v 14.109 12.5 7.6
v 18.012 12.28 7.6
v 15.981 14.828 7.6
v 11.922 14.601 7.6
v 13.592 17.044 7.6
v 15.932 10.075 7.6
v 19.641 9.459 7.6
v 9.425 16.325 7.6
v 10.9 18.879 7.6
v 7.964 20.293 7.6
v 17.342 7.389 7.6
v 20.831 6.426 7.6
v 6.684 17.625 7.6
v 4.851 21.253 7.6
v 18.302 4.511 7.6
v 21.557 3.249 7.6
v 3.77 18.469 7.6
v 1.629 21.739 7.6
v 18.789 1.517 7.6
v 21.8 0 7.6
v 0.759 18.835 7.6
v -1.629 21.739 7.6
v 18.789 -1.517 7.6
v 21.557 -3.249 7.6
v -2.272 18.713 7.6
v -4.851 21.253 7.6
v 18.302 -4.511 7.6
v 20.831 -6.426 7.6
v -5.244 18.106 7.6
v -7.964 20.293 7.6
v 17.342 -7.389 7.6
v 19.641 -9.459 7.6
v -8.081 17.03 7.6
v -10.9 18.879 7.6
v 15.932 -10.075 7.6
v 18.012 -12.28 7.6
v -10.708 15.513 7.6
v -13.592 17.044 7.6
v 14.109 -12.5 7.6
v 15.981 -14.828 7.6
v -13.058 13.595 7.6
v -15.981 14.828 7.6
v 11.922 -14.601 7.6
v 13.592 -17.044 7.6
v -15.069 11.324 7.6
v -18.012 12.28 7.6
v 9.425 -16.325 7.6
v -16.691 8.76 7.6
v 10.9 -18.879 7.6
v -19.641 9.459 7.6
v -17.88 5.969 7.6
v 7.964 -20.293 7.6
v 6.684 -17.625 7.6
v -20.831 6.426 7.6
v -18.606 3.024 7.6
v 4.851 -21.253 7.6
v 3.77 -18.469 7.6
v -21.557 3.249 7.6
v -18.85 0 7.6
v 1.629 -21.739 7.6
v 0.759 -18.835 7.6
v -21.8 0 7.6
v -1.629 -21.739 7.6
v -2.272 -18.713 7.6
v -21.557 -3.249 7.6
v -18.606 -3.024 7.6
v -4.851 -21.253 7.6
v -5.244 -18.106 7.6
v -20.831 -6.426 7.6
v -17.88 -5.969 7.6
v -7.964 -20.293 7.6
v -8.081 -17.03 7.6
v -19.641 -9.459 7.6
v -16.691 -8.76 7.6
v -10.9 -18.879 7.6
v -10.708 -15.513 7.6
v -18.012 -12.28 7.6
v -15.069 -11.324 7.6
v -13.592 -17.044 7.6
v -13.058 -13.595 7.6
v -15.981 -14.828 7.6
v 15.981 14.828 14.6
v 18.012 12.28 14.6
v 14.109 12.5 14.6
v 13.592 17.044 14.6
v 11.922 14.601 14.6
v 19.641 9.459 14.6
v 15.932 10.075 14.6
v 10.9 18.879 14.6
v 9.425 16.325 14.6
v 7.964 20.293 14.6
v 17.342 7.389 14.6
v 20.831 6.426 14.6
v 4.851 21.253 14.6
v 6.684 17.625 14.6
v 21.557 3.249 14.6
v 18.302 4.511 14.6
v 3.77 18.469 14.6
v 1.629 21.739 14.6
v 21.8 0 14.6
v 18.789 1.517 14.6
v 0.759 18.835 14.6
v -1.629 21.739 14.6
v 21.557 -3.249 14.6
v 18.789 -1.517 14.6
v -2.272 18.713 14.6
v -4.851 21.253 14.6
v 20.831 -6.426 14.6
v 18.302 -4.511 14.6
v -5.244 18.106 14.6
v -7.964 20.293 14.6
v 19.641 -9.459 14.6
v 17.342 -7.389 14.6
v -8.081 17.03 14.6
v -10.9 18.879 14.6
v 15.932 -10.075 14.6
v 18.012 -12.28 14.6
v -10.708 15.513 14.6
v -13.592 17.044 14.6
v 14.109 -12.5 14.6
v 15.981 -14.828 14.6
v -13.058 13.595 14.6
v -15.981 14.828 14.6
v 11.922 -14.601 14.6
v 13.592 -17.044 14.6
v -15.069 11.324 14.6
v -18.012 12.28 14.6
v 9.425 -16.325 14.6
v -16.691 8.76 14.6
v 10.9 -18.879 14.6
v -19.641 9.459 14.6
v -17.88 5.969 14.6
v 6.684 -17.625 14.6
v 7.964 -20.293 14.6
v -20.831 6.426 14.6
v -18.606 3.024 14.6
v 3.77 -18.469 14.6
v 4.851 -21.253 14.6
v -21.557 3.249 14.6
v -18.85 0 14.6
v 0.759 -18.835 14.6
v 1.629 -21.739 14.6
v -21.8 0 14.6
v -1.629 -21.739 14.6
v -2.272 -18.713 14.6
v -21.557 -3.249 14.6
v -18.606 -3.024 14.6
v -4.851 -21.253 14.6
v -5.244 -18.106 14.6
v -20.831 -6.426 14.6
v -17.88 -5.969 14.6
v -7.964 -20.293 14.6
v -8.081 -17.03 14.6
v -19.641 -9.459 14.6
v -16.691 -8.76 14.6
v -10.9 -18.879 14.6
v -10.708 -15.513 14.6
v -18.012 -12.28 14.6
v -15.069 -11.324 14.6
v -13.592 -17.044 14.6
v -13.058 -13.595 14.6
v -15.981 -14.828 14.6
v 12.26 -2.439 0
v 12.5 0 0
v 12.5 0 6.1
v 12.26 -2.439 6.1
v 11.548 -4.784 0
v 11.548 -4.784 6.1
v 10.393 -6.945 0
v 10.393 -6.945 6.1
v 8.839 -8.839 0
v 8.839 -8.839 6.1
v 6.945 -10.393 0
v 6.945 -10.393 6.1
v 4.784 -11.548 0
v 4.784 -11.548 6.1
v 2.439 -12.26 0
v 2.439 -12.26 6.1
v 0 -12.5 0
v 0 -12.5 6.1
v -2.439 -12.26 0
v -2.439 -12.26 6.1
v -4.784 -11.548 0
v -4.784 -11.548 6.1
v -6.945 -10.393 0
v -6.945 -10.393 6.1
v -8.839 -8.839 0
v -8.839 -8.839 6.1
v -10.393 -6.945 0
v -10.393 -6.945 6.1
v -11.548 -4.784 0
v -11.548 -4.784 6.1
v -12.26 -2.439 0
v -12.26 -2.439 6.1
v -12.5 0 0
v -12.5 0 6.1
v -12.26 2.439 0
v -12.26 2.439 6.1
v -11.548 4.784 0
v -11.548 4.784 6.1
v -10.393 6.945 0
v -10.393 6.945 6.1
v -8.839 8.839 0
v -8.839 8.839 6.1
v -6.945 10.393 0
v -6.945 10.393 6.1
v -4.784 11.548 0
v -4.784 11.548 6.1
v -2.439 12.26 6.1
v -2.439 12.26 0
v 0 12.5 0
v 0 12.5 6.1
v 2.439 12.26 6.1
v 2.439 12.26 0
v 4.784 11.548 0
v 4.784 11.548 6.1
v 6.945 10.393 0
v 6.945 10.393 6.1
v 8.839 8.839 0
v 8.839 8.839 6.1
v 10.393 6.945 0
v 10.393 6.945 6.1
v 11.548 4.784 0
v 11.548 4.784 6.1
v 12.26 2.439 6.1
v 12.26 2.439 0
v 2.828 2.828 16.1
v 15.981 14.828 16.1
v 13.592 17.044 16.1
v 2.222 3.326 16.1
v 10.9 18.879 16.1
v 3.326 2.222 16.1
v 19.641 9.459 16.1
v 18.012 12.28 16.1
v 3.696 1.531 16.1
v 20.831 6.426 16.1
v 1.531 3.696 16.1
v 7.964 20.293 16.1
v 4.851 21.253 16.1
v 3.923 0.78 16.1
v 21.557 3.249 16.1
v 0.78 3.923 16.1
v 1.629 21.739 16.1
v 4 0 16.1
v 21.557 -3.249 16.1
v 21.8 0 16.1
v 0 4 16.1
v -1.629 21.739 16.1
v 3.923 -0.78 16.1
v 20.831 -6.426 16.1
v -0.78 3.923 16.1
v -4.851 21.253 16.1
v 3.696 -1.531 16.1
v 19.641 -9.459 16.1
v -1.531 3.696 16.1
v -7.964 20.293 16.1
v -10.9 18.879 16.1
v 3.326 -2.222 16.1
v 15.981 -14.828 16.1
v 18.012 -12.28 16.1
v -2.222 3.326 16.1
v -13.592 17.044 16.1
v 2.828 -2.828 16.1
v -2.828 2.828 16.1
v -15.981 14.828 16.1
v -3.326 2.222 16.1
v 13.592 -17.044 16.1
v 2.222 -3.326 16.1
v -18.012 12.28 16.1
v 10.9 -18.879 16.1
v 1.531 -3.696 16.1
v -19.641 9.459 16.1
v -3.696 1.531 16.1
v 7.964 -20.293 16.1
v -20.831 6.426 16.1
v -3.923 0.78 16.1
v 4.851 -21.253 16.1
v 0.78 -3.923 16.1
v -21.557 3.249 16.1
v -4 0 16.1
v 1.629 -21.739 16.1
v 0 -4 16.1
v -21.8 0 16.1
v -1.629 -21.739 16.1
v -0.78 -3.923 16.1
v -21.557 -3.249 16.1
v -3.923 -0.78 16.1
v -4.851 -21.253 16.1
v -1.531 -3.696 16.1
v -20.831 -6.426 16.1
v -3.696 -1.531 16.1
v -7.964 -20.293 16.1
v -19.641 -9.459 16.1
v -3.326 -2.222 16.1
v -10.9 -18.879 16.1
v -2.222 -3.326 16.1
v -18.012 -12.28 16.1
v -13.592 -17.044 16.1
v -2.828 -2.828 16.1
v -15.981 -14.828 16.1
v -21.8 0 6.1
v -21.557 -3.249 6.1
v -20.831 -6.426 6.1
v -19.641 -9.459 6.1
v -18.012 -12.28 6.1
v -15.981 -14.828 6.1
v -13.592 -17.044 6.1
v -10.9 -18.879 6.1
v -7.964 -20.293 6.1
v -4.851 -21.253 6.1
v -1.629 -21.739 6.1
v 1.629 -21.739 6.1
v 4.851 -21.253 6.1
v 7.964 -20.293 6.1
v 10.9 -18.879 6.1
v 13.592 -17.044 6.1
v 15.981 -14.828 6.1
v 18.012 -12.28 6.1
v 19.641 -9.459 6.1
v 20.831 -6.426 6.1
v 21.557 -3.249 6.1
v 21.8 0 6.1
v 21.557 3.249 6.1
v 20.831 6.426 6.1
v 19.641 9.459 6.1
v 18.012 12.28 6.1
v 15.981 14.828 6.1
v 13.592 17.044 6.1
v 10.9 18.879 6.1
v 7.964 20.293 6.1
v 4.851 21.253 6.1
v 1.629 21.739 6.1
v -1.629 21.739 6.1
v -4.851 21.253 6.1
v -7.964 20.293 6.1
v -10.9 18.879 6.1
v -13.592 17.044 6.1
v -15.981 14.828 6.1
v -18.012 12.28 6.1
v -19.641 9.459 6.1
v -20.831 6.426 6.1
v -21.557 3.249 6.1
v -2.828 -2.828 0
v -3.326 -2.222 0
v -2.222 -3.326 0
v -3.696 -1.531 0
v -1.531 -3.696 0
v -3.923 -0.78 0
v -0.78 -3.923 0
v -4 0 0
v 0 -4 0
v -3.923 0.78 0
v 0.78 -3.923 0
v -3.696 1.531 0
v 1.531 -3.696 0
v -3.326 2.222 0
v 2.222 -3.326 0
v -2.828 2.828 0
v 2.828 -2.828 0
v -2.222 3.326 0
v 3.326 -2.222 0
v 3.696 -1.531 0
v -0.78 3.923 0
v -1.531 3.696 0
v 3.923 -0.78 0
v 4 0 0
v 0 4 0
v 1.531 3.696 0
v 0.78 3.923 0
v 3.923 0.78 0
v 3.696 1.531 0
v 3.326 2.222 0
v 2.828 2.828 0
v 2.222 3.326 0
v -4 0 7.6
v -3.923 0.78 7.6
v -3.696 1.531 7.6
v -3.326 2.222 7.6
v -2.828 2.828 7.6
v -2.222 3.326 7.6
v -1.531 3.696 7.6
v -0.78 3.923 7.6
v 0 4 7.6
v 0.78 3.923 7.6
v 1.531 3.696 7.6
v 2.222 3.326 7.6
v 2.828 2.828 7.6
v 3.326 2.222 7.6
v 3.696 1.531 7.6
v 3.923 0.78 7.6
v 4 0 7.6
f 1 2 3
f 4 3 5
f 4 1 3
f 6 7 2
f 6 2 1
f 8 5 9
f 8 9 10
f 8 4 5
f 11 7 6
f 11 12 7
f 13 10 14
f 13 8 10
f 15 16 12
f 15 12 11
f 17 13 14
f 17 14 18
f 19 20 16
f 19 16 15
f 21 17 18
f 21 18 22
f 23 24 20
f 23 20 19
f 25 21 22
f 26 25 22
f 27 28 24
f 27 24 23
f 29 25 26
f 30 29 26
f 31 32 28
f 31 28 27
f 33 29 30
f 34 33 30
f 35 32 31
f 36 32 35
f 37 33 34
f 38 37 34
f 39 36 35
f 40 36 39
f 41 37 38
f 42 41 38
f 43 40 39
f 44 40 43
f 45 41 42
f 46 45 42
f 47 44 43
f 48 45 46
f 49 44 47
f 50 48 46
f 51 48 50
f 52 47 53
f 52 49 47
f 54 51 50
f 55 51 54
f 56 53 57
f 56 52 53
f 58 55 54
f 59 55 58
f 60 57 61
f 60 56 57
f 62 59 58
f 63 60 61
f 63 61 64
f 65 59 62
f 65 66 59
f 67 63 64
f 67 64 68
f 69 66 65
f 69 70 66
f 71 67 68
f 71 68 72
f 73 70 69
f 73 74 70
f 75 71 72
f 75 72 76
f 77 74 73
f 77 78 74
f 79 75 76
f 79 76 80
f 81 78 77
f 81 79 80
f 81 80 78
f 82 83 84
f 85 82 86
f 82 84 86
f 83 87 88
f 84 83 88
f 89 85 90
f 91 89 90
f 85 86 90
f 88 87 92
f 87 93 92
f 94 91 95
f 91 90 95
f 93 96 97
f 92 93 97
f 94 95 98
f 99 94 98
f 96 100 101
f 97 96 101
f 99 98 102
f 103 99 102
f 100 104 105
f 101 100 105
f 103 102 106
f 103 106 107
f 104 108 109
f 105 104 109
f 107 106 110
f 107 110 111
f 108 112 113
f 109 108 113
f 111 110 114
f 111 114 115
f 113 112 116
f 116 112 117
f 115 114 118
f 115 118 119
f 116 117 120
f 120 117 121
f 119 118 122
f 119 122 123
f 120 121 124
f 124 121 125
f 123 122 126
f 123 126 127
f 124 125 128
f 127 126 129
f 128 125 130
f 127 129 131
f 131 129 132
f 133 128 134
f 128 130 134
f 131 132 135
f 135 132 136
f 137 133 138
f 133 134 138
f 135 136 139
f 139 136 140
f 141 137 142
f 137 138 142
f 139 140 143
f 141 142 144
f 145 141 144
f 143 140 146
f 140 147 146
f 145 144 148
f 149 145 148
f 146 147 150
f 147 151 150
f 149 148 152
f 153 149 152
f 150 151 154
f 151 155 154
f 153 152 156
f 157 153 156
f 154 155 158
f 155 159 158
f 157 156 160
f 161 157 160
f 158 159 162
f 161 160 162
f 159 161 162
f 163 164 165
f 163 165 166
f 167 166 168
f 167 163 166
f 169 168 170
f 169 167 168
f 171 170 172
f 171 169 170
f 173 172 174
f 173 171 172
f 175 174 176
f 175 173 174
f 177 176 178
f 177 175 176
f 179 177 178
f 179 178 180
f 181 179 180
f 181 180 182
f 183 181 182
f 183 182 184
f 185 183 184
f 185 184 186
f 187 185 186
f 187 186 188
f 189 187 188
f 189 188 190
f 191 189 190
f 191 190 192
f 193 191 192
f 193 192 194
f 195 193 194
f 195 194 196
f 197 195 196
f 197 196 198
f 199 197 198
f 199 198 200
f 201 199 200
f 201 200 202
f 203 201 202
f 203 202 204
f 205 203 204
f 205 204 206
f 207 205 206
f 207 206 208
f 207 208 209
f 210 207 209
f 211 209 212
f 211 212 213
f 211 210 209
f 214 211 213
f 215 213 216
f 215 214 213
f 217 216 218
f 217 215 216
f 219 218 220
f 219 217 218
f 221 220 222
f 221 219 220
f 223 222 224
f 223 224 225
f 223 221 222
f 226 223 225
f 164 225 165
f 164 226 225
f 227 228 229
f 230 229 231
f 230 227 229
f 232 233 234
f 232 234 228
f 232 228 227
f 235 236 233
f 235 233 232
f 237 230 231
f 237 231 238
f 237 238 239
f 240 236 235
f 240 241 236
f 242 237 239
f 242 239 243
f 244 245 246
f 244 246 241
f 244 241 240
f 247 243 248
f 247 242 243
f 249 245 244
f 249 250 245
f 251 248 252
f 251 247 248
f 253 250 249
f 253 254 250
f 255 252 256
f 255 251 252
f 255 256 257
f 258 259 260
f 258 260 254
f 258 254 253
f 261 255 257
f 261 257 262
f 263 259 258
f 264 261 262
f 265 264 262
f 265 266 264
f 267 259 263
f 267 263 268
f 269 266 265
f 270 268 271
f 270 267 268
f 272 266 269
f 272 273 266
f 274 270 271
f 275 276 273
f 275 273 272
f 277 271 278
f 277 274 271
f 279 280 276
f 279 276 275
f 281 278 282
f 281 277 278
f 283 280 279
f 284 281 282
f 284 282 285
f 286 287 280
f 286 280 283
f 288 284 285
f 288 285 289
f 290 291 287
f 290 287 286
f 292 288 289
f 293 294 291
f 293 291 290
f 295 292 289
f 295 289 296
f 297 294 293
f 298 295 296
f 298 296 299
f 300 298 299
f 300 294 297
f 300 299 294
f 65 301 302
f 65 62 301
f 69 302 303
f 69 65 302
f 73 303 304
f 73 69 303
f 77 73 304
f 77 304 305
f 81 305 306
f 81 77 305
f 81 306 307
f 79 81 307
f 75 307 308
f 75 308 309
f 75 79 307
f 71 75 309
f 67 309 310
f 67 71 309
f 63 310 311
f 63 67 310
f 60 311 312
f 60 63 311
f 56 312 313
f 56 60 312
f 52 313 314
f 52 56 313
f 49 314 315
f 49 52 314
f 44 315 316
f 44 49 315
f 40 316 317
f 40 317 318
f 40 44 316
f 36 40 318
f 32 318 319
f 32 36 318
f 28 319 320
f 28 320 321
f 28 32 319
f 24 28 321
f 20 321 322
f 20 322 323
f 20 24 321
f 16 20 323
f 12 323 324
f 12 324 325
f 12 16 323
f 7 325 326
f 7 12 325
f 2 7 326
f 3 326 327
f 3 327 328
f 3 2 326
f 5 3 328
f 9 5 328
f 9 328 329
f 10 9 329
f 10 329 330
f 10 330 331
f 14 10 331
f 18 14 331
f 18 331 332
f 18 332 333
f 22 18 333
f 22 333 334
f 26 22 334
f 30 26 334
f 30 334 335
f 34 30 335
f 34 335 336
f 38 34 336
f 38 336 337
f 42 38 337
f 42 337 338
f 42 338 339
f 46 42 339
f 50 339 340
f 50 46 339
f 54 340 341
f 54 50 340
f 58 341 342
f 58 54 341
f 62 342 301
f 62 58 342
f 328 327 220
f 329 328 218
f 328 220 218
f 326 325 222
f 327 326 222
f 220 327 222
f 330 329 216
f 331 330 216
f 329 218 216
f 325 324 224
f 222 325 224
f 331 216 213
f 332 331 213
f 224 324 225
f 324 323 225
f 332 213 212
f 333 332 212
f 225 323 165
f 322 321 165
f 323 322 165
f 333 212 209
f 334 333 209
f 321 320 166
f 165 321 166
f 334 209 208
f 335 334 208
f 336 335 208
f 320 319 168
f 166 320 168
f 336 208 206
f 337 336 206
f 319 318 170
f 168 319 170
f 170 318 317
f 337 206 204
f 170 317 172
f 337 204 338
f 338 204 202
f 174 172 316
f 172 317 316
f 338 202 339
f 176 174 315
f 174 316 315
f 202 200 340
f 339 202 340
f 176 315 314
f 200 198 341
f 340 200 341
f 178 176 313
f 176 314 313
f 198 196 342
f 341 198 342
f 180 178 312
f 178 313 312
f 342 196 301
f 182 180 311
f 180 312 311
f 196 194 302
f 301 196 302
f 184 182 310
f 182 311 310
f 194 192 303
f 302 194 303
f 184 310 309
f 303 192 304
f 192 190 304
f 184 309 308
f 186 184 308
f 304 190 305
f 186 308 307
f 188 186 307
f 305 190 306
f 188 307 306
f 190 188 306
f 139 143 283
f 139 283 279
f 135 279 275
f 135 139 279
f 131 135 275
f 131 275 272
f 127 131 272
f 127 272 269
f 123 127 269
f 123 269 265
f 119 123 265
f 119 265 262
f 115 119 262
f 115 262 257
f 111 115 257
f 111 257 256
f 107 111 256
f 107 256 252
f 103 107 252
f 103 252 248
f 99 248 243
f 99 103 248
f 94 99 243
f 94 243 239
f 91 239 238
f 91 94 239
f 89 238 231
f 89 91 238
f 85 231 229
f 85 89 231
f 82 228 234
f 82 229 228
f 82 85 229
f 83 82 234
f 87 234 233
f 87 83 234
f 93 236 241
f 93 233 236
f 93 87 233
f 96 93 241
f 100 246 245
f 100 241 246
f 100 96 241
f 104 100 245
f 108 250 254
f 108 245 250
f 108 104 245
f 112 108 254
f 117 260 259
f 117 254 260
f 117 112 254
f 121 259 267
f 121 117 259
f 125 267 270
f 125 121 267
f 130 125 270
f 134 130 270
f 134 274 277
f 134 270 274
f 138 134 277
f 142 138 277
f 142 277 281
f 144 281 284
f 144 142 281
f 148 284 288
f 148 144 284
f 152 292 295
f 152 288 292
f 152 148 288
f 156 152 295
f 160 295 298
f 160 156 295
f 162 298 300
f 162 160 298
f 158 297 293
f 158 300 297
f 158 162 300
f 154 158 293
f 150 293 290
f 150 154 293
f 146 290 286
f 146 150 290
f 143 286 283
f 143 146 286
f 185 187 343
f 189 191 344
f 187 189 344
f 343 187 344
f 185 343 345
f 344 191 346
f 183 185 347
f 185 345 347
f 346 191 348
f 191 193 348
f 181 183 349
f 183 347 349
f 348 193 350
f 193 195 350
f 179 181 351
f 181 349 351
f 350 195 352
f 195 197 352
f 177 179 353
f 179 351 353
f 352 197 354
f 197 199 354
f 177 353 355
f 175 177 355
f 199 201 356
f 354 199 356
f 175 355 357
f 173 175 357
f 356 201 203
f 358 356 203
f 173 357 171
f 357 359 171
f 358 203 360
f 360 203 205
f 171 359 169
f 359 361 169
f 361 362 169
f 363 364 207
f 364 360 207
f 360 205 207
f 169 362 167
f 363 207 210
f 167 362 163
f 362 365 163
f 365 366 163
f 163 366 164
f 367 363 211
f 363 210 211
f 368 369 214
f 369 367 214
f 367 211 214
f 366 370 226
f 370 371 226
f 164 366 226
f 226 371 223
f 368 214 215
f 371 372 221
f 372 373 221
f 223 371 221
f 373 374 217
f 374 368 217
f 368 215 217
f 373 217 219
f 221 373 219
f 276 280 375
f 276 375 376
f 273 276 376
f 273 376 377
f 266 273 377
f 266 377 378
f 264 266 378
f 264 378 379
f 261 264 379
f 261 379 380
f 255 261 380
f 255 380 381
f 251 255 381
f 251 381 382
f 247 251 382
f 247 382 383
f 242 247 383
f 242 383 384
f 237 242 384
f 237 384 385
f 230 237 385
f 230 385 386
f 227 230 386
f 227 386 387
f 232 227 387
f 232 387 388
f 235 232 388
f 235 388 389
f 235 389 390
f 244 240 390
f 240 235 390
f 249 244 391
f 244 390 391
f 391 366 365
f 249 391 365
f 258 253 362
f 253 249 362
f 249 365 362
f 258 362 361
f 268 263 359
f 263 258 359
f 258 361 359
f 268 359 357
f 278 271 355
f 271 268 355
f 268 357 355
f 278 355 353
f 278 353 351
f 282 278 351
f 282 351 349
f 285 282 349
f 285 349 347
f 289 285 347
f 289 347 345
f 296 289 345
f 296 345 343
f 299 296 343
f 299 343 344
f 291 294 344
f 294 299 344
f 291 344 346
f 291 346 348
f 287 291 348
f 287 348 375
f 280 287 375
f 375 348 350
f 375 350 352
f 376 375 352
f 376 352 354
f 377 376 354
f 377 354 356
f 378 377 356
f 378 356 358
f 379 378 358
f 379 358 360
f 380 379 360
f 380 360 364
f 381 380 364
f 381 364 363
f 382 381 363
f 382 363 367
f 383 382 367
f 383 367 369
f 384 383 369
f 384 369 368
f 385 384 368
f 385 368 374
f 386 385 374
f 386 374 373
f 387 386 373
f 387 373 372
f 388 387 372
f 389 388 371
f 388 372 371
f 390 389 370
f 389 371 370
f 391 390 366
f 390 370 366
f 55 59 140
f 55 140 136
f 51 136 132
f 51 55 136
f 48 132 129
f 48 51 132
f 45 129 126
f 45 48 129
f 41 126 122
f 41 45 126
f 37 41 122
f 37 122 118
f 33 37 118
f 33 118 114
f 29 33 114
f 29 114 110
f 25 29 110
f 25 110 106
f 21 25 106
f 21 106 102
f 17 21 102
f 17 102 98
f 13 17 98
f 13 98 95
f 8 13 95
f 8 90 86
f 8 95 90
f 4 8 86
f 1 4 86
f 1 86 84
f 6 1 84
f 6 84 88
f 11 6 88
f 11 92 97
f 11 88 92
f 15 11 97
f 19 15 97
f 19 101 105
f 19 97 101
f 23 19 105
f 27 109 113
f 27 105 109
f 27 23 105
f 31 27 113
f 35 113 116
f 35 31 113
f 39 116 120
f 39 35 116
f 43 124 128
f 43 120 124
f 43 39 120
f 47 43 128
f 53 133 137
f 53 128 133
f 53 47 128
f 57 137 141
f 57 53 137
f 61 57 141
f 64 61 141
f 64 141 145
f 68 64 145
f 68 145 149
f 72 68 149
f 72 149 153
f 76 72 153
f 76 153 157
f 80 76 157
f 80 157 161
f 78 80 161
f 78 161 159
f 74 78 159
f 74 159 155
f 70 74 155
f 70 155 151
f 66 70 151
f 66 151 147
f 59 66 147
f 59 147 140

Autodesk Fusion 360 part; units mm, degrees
sketch "Sketch1" plane through (0, 0, 0) normal (0, 0, 1) x (1, 0, 0)
  circle A0 centre (0, 0) radius 12.5
  circle A1 centre (0, 0) radius 4
  dimension "d1" = 25
  dimension "d2" = 8
extrude "Extrude1" add sketch "Sketch1" along normal blind 7.6
sketch "Sketch2" plane through (0, 0, 7.6) normal (0, 0, 1) x (-1, 0, 0)
  circle A0 centre (0, 0) radius 4
  circle A1 centre (0, 0) radius 12.5
  circle A2 centre (0, 0) radius 18.85
  circle A3 centre (0, 0) radius 21.8
  dimension "d5" = 37.7
  dimension "d11" = 43.6
extrude "Extrude2" add sketch "Sketch2" along normal blind 7 contours A1 | A2
sketch "Sketch3" plane through (0, 0, 14.6) normal (0, 0, 1) x (-1, 0, 0)
  circle A0 centre (0, 0) radius 4
  circle A1 centre (0, 0) radius 18.85
  circle A2 centre (0, 0) radius 21.8
  dimension "d8" = 43.6
extrude "Extrude3" add sketch "Sketch3" along normal blind 1.5 contours A1 | A2
extrude "Extrude4" add sketch "Sketch2" against normal blind 1.5 contours A2 | A3
